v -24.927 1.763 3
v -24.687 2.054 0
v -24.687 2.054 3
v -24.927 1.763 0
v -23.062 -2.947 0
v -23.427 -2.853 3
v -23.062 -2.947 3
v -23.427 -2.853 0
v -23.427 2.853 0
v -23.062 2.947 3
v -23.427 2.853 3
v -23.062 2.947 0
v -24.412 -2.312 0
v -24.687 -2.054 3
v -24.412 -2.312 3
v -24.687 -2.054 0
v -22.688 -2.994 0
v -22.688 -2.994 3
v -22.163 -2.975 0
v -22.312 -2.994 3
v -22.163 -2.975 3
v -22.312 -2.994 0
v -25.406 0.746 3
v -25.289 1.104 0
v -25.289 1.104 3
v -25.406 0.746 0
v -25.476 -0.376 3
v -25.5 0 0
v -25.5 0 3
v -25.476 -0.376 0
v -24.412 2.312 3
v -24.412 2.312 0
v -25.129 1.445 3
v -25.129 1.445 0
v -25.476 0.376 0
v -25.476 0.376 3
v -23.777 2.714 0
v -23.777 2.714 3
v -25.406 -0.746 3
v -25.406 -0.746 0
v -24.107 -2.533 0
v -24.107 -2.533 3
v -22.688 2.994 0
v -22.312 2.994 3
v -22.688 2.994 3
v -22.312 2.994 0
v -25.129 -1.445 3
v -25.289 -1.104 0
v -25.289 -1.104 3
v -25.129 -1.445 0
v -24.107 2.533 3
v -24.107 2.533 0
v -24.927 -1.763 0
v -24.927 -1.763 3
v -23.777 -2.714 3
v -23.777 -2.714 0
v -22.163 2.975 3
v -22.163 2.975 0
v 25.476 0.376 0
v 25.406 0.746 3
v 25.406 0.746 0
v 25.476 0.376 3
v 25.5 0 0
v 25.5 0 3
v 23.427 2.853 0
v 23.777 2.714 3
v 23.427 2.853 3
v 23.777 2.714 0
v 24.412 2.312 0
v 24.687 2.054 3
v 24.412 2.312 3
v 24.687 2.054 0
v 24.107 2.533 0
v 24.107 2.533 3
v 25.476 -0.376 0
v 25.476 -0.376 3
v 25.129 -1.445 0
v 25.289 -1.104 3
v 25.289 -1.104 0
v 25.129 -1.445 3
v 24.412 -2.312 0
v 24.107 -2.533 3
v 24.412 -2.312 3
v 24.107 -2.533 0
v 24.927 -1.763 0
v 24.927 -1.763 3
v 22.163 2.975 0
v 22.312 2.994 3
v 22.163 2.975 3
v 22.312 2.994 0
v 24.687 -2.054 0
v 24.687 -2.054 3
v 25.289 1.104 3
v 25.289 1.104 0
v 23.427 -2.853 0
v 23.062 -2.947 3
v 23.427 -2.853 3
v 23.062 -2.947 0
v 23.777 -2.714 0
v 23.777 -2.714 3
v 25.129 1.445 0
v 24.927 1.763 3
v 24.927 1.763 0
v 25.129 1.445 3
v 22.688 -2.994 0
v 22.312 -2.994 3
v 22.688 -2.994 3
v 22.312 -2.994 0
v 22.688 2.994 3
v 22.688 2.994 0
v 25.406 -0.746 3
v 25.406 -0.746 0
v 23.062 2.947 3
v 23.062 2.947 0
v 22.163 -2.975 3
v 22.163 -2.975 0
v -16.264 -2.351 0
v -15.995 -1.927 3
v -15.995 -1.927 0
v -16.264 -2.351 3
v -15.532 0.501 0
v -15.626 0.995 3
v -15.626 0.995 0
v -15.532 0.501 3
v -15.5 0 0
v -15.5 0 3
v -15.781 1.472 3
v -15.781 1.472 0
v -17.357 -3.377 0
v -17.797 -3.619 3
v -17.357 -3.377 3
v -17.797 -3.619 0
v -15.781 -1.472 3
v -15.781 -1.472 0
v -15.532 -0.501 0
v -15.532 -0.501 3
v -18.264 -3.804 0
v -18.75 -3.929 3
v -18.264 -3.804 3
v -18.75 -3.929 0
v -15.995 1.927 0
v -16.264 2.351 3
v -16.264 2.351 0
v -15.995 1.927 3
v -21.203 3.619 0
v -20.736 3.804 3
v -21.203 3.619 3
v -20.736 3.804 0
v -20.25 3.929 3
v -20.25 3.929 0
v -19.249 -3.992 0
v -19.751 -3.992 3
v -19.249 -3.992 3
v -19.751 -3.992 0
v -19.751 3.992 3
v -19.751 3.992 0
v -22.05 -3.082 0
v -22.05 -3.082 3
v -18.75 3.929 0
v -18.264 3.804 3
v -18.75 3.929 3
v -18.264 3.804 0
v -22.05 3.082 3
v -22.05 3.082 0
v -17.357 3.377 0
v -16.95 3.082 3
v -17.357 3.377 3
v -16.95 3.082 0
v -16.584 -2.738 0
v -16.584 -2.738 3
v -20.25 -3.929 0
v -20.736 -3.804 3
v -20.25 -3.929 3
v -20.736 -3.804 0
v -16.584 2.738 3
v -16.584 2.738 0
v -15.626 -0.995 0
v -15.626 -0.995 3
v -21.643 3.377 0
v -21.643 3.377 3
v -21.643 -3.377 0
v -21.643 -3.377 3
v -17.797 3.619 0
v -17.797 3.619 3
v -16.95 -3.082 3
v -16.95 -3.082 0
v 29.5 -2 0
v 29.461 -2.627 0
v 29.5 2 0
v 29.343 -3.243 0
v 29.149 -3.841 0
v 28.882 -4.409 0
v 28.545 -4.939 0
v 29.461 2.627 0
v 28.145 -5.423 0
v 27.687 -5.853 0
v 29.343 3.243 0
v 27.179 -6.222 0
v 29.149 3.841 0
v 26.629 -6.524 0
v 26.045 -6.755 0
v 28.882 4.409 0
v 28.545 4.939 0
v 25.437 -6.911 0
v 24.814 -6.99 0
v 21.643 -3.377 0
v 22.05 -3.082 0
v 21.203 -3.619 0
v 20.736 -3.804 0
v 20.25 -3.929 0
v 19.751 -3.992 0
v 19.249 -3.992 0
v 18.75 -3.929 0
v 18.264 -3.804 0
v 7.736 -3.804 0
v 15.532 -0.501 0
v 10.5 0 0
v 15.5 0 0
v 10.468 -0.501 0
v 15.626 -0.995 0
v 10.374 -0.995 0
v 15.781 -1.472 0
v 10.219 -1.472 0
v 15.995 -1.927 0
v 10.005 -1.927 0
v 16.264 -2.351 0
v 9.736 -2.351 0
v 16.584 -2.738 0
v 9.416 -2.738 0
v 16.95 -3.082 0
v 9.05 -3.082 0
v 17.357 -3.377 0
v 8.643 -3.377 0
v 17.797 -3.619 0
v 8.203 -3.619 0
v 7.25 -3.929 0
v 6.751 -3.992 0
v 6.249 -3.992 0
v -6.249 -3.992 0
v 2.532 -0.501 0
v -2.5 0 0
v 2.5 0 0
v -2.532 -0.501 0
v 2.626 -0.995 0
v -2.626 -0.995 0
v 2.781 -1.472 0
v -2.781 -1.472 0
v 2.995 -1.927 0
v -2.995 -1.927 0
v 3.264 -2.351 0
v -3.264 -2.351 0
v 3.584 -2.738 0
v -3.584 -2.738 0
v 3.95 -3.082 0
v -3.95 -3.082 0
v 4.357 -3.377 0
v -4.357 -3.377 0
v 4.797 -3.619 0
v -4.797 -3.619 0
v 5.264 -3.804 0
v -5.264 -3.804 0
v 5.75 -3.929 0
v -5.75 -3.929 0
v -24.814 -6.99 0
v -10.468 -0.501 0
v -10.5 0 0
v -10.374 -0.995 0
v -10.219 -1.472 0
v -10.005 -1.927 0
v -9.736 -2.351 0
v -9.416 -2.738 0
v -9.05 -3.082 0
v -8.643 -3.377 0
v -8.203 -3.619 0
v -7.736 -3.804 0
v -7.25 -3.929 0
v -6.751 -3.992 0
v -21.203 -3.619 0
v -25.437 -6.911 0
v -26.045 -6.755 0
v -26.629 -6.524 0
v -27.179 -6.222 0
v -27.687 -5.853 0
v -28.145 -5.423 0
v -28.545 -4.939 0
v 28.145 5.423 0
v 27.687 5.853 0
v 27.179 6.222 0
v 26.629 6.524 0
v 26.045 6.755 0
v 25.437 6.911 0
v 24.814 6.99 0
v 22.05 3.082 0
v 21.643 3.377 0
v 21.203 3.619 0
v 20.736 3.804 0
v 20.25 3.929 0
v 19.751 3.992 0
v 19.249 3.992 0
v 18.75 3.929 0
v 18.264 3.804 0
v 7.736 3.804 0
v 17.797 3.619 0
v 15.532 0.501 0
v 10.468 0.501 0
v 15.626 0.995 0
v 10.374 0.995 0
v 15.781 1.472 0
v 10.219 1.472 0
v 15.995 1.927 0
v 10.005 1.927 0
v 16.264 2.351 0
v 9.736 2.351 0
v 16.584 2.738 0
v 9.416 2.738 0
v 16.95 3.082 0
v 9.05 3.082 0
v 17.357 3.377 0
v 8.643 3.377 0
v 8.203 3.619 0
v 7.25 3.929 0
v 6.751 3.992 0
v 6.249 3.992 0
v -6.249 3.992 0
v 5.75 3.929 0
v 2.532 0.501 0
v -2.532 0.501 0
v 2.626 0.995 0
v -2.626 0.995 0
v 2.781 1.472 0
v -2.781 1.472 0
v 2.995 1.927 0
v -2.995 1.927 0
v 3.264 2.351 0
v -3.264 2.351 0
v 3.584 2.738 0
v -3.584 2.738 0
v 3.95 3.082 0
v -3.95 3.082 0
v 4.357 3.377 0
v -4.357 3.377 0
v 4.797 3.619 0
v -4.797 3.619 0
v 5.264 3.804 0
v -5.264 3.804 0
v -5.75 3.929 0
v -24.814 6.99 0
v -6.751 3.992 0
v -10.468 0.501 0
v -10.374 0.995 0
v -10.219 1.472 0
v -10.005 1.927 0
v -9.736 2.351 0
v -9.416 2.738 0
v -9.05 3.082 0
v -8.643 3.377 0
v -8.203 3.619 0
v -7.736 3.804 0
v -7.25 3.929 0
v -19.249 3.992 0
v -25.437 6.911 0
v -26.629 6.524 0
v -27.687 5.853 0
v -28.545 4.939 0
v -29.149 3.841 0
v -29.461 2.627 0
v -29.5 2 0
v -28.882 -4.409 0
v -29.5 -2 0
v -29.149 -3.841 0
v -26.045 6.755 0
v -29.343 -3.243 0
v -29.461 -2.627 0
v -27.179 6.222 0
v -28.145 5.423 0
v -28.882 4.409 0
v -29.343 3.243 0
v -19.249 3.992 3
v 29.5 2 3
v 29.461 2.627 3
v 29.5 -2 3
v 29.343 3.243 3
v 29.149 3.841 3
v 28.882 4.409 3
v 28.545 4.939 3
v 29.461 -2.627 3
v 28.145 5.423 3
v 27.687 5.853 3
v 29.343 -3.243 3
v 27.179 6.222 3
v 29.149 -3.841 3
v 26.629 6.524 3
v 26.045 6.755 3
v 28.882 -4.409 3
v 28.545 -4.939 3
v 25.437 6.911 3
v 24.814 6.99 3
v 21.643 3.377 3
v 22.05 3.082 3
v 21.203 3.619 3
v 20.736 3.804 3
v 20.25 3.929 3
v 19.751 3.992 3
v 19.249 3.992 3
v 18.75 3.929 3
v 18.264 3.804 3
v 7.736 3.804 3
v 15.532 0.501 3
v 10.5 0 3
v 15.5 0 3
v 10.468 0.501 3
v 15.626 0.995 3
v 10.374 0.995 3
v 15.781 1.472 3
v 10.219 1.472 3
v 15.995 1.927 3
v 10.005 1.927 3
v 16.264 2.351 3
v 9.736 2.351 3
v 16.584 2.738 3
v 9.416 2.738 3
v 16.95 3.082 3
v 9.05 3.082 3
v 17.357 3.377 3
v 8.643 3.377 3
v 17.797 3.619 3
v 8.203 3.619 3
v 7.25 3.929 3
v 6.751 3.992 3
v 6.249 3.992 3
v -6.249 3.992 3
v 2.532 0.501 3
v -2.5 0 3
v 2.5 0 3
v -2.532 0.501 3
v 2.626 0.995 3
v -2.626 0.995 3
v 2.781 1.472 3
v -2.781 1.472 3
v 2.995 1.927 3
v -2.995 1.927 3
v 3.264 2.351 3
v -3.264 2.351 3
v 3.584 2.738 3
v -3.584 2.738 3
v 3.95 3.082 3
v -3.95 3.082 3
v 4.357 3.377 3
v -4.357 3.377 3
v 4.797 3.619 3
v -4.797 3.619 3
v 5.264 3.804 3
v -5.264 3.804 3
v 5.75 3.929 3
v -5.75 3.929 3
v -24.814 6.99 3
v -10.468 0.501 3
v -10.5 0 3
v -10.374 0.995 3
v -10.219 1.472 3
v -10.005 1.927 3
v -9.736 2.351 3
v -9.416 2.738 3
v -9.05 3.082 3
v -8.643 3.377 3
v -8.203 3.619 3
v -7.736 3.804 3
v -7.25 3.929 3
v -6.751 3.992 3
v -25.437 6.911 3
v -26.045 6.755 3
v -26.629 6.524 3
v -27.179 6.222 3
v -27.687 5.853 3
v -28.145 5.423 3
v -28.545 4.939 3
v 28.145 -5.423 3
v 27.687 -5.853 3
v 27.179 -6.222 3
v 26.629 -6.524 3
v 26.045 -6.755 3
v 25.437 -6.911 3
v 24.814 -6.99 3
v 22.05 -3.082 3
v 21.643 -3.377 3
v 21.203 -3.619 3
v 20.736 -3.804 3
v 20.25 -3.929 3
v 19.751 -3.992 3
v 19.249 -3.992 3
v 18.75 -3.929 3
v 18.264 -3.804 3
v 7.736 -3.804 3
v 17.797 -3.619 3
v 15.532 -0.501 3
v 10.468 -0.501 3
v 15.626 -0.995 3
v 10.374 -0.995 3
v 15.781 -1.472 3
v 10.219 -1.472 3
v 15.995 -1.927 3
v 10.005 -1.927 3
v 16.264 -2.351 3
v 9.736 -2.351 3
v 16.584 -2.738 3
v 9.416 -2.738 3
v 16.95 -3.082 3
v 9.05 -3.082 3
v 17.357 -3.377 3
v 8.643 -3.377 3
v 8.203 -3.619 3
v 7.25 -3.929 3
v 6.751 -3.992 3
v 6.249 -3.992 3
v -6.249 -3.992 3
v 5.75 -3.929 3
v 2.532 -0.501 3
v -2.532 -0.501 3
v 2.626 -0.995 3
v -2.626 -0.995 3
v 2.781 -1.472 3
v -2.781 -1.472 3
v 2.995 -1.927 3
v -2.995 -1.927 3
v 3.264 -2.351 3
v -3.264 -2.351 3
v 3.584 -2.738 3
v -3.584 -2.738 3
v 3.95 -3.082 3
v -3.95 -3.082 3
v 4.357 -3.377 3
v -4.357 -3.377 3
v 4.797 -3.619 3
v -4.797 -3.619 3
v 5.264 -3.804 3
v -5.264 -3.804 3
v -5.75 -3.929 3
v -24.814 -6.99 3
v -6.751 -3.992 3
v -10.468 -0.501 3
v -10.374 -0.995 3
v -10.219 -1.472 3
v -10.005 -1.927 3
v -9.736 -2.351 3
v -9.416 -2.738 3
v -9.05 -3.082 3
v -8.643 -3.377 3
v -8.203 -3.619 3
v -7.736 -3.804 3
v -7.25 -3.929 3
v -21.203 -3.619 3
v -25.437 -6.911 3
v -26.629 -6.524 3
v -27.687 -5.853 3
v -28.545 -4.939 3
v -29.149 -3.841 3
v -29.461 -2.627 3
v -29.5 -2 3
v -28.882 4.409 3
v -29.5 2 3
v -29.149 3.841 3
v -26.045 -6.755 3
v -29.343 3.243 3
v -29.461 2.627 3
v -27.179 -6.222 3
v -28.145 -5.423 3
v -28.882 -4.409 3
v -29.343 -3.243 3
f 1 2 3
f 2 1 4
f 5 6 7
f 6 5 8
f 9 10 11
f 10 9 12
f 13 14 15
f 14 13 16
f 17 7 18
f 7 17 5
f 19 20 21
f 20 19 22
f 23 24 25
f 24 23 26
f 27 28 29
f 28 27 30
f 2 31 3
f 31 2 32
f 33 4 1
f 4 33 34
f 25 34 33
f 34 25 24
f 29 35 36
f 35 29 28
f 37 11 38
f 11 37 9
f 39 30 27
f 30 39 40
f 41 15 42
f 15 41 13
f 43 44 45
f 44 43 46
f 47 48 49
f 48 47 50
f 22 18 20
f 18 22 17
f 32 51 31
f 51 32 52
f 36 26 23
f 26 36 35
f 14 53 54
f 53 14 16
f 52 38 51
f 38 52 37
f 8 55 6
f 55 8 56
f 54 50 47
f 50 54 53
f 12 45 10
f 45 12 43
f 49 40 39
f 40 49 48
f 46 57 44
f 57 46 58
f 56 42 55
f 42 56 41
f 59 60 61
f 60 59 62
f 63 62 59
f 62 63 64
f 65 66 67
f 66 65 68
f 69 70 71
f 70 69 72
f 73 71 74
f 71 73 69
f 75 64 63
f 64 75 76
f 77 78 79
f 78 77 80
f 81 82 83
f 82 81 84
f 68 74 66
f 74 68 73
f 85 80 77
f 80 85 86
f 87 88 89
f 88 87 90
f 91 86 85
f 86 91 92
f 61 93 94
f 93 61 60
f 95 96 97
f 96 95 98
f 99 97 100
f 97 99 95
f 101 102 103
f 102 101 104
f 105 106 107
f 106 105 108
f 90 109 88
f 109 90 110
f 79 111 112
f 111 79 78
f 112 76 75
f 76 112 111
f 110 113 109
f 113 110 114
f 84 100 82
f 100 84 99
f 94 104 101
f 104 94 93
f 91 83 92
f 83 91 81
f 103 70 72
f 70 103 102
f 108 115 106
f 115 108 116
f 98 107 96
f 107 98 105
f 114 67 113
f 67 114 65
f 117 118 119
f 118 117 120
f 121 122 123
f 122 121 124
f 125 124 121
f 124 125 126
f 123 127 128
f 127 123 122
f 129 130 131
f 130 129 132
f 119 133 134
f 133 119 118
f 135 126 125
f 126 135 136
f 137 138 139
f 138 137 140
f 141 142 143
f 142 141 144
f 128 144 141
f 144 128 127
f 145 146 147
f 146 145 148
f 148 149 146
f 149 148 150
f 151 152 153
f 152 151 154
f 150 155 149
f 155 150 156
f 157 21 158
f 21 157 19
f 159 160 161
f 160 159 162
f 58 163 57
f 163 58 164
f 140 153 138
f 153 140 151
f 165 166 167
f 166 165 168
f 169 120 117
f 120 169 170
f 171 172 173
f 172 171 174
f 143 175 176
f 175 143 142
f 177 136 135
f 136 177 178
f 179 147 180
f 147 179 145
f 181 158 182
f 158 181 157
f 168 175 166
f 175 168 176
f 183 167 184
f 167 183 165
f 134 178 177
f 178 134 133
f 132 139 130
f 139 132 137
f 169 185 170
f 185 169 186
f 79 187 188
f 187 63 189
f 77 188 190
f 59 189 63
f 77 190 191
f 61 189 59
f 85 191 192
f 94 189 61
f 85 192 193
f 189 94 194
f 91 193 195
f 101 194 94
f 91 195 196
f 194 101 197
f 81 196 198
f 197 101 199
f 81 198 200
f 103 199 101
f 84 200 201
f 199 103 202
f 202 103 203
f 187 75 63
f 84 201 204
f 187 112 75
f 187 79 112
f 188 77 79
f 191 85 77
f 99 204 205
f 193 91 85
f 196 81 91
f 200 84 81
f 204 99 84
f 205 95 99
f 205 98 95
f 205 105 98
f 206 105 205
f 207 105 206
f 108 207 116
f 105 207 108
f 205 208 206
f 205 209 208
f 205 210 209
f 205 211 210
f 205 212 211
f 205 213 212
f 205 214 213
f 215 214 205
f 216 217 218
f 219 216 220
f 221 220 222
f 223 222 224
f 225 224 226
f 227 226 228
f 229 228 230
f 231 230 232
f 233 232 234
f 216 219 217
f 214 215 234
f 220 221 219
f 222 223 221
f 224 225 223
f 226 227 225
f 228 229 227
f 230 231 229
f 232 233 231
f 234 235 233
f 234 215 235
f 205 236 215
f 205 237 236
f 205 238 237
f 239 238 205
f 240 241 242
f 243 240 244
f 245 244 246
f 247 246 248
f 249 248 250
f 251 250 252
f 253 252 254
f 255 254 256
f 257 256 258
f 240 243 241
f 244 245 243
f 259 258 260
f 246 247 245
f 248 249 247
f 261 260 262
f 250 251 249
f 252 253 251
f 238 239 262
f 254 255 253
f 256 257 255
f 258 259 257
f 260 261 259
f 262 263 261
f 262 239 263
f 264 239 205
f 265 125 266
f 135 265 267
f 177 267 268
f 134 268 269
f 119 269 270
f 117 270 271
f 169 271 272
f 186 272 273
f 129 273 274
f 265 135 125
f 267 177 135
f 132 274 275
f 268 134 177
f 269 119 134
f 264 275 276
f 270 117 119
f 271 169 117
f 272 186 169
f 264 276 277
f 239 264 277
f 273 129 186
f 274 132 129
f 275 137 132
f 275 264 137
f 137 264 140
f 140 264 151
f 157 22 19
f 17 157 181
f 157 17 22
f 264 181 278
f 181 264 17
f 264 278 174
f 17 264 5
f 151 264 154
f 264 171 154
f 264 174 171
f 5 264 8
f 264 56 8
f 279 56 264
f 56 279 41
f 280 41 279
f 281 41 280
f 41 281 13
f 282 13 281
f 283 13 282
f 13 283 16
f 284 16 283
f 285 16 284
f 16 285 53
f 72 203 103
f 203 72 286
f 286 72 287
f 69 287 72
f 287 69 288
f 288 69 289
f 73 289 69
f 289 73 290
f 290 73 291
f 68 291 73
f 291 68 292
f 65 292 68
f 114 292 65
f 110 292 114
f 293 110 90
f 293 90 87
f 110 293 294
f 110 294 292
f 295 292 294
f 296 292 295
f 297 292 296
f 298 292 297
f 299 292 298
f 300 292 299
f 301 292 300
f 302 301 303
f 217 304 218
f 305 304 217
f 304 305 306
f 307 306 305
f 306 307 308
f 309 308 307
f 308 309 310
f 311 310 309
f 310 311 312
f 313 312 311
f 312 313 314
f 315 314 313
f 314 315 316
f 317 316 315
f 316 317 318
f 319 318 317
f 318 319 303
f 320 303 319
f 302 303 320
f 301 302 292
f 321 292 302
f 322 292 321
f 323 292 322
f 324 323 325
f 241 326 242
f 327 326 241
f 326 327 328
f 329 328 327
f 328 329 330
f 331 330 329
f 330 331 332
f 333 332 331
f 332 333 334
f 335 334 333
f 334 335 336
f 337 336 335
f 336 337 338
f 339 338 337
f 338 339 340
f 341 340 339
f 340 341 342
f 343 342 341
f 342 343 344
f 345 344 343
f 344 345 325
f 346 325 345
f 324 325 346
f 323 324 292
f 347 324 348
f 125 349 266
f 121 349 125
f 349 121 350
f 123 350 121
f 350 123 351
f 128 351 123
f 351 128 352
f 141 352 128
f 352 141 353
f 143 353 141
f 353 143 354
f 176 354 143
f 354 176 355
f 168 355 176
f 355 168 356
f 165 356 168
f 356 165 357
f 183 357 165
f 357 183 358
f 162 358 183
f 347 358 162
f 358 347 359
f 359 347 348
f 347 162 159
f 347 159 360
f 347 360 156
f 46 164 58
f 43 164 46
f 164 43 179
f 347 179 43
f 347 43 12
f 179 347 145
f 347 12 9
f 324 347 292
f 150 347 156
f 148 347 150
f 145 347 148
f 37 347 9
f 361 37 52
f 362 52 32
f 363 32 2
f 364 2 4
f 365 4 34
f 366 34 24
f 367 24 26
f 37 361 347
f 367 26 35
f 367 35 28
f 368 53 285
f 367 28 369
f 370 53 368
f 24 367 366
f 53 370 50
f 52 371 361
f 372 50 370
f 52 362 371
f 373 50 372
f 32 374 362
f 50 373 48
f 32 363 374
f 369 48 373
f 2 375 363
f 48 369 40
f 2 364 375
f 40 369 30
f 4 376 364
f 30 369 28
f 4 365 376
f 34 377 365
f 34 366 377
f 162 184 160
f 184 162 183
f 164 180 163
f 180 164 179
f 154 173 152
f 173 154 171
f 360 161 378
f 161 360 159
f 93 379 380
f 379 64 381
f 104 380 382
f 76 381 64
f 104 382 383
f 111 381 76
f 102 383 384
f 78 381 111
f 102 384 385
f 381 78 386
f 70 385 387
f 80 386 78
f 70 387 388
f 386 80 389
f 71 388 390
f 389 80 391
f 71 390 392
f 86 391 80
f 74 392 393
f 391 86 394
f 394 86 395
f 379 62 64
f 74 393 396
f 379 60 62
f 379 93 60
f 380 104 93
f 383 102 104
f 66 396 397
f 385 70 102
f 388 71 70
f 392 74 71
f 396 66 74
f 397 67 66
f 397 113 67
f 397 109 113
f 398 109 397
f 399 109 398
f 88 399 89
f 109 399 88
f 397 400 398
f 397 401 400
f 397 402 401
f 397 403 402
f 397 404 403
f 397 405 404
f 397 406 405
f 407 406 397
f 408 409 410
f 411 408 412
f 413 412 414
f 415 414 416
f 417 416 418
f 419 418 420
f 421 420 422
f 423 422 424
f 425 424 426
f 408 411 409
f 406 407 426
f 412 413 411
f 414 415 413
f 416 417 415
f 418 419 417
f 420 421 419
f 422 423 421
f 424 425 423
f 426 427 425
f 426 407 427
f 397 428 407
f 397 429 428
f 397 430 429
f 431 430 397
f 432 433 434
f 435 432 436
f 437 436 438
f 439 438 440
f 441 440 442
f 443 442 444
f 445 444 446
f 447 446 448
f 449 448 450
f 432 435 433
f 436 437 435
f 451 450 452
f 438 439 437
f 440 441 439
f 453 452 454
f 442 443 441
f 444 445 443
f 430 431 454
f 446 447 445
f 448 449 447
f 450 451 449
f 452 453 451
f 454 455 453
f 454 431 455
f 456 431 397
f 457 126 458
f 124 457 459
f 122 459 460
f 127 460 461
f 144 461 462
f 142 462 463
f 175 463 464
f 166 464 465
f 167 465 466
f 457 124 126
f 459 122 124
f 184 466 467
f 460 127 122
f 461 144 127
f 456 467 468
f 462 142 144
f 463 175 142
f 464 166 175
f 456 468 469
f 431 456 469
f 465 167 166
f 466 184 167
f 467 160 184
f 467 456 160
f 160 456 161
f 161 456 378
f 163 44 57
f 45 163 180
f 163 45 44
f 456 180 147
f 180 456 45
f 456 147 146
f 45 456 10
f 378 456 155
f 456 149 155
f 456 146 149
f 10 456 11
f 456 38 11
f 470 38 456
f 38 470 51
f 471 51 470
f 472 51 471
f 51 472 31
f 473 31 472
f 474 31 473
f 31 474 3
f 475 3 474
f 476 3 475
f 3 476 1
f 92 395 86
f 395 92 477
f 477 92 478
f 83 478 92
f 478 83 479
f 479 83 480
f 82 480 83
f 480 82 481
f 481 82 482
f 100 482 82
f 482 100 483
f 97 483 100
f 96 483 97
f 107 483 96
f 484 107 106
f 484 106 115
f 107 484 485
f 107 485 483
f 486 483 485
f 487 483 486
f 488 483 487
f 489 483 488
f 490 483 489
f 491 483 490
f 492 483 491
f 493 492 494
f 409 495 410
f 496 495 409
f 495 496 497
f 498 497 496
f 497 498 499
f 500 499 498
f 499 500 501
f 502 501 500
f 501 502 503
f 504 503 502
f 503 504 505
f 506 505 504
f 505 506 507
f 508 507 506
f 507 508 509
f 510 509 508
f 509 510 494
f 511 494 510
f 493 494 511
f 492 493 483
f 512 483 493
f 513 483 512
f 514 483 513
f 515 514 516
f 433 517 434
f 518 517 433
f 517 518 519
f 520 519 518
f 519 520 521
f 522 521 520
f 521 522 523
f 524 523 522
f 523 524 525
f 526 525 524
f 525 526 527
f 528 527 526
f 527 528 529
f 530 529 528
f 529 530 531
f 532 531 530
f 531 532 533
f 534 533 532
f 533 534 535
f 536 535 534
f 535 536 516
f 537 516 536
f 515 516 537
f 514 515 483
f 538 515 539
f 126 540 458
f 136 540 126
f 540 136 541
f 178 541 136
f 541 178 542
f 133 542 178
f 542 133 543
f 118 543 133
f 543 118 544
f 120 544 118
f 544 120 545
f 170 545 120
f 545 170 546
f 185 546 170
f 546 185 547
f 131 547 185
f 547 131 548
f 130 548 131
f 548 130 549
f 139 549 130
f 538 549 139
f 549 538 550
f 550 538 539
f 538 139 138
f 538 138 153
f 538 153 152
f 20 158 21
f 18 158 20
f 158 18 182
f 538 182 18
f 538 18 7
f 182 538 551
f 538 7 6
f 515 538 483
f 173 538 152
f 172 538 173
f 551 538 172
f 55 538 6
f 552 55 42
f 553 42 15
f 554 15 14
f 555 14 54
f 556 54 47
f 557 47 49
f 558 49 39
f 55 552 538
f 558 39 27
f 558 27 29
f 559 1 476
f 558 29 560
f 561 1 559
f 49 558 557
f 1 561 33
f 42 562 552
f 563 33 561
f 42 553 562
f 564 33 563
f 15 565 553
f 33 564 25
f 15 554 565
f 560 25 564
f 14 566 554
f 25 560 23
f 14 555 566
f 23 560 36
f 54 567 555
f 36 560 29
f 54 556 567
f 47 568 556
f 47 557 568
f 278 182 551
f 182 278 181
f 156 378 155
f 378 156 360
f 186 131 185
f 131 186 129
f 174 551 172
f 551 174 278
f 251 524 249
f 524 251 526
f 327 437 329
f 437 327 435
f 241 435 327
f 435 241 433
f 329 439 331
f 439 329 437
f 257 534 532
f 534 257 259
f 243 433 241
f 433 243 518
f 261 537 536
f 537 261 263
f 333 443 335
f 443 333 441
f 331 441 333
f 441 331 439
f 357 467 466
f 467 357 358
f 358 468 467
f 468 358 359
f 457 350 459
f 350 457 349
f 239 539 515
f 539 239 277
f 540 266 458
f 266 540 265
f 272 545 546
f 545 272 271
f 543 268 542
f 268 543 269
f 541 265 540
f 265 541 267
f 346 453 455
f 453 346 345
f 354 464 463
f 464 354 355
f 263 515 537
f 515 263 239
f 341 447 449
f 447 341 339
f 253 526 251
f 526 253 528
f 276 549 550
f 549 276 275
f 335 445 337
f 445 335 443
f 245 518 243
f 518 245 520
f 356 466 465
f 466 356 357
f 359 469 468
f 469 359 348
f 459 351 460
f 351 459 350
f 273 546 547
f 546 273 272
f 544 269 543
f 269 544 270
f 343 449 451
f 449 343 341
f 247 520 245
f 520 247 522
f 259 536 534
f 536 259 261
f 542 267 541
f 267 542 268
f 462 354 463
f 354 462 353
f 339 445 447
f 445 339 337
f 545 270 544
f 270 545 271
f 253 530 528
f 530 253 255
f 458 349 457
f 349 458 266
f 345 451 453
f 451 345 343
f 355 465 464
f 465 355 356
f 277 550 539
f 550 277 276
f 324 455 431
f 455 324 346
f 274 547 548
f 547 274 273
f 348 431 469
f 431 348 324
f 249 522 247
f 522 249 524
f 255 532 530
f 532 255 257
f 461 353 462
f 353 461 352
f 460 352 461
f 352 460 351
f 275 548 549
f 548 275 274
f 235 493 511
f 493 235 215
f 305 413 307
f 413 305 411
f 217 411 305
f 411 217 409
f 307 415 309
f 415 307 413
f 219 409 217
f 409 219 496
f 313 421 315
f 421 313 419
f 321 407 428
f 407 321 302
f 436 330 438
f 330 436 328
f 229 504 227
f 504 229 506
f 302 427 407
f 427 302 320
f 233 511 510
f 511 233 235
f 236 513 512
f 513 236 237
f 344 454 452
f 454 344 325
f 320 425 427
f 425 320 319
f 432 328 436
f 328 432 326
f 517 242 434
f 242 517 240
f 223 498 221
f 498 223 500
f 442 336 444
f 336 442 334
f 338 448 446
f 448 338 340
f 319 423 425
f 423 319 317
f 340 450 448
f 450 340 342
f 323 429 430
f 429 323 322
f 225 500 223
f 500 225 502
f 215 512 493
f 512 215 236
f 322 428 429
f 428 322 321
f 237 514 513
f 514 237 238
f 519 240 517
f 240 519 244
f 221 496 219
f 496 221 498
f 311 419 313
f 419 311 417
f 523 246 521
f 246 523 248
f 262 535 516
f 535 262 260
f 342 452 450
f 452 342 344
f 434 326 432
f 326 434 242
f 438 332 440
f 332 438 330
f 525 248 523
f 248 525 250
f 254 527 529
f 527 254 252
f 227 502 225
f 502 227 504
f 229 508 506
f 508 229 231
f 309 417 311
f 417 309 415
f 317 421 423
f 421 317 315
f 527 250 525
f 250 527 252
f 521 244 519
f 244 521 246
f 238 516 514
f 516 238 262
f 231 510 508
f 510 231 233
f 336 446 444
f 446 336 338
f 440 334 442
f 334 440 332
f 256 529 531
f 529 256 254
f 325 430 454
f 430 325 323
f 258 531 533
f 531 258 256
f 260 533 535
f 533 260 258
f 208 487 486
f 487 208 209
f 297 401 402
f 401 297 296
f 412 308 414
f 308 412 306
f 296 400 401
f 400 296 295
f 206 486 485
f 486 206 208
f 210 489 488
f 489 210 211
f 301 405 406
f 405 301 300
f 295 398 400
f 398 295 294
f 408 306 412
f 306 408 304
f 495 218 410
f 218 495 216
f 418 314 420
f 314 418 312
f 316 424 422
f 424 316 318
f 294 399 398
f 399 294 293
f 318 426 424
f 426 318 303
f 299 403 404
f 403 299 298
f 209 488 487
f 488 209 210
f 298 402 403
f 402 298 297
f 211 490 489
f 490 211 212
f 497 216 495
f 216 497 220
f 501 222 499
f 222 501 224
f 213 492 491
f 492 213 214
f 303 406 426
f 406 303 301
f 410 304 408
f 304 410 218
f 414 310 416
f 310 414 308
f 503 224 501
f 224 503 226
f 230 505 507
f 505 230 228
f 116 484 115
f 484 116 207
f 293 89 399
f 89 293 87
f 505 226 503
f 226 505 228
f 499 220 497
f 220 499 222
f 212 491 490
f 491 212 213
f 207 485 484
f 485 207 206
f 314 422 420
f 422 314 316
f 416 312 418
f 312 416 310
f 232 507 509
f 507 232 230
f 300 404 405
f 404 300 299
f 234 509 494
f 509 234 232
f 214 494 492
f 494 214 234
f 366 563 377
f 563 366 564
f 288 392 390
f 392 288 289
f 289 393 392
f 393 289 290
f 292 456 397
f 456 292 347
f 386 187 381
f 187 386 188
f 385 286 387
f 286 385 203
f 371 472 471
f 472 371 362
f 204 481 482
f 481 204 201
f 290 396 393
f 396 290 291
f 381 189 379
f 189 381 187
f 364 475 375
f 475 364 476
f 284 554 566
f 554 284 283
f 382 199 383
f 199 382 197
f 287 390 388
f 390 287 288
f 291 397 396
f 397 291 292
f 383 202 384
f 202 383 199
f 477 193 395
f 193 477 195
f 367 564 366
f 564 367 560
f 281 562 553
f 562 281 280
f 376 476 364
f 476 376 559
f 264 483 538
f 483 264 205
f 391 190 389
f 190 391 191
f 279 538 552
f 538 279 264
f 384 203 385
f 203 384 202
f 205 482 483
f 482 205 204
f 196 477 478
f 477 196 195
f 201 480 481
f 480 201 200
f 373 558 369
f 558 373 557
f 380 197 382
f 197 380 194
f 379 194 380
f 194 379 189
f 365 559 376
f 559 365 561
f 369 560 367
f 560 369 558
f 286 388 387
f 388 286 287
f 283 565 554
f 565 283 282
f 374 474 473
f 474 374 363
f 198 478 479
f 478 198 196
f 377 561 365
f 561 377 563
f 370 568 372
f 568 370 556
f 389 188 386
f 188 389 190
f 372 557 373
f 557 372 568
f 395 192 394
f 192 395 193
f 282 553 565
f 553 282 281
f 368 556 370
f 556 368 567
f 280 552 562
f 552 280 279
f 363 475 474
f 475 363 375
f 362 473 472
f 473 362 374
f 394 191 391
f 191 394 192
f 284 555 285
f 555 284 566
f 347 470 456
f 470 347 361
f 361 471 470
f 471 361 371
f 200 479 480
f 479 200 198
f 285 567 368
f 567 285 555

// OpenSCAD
$fn = 50;


difference() {
	union() {
		hull() {
			translate(v = [-24.5000000000, 2.0000000000, 0]) {
				cylinder(h = 3, r = 5);
			}
			translate(v = [24.5000000000, 2.0000000000, 0]) {
				cylinder(h = 3, r = 5);
			}
			translate(v = [-24.5000000000, -2.0000000000, 0]) {
				cylinder(h = 3, r = 5);
			}
			translate(v = [24.5000000000, -2.0000000000, 0]) {
				cylinder(h = 3, r = 5);
			}
		}
	}
	union() {
		#translate(v = [-22.5000000000, 0.0000000000, -100.0000000000]) {
			cylinder(h = 200, r = 3.0000000000);
		}
		#translate(v = [-22.5000000000, 0.0000000000, -100.0000000000]) {
			cylinder(h = 200, r = 3.0000000000);
		}
		#translate(v = [22.5000000000, 0.0000000000, -100.0000000000]) {
			cylinder(h = 200, r = 3.0000000000);
		}
		#translate(v = [22.5000000000, 0.0000000000, -100.0000000000]) {
			cylinder(h = 200, r = 3.0000000000);
		}
		#translate(v = [-19.5000000000, 0, 0]) {
			cylinder(h = 3, r = 4.0000000000);
		}
		#translate(v = [-6.5000000000, 0, 0]) {
			cylinder(h = 3, r = 4.0000000000);
		}
		#translate(v = [6.5000000000, 0, 0]) {
			cylinder(h = 3, r = 4.0000000000);
		}
		#translate(v = [19.5000000000, 0, 0]) {
			cylinder(h = 3, r = 4.0000000000);
		}
	}
}
